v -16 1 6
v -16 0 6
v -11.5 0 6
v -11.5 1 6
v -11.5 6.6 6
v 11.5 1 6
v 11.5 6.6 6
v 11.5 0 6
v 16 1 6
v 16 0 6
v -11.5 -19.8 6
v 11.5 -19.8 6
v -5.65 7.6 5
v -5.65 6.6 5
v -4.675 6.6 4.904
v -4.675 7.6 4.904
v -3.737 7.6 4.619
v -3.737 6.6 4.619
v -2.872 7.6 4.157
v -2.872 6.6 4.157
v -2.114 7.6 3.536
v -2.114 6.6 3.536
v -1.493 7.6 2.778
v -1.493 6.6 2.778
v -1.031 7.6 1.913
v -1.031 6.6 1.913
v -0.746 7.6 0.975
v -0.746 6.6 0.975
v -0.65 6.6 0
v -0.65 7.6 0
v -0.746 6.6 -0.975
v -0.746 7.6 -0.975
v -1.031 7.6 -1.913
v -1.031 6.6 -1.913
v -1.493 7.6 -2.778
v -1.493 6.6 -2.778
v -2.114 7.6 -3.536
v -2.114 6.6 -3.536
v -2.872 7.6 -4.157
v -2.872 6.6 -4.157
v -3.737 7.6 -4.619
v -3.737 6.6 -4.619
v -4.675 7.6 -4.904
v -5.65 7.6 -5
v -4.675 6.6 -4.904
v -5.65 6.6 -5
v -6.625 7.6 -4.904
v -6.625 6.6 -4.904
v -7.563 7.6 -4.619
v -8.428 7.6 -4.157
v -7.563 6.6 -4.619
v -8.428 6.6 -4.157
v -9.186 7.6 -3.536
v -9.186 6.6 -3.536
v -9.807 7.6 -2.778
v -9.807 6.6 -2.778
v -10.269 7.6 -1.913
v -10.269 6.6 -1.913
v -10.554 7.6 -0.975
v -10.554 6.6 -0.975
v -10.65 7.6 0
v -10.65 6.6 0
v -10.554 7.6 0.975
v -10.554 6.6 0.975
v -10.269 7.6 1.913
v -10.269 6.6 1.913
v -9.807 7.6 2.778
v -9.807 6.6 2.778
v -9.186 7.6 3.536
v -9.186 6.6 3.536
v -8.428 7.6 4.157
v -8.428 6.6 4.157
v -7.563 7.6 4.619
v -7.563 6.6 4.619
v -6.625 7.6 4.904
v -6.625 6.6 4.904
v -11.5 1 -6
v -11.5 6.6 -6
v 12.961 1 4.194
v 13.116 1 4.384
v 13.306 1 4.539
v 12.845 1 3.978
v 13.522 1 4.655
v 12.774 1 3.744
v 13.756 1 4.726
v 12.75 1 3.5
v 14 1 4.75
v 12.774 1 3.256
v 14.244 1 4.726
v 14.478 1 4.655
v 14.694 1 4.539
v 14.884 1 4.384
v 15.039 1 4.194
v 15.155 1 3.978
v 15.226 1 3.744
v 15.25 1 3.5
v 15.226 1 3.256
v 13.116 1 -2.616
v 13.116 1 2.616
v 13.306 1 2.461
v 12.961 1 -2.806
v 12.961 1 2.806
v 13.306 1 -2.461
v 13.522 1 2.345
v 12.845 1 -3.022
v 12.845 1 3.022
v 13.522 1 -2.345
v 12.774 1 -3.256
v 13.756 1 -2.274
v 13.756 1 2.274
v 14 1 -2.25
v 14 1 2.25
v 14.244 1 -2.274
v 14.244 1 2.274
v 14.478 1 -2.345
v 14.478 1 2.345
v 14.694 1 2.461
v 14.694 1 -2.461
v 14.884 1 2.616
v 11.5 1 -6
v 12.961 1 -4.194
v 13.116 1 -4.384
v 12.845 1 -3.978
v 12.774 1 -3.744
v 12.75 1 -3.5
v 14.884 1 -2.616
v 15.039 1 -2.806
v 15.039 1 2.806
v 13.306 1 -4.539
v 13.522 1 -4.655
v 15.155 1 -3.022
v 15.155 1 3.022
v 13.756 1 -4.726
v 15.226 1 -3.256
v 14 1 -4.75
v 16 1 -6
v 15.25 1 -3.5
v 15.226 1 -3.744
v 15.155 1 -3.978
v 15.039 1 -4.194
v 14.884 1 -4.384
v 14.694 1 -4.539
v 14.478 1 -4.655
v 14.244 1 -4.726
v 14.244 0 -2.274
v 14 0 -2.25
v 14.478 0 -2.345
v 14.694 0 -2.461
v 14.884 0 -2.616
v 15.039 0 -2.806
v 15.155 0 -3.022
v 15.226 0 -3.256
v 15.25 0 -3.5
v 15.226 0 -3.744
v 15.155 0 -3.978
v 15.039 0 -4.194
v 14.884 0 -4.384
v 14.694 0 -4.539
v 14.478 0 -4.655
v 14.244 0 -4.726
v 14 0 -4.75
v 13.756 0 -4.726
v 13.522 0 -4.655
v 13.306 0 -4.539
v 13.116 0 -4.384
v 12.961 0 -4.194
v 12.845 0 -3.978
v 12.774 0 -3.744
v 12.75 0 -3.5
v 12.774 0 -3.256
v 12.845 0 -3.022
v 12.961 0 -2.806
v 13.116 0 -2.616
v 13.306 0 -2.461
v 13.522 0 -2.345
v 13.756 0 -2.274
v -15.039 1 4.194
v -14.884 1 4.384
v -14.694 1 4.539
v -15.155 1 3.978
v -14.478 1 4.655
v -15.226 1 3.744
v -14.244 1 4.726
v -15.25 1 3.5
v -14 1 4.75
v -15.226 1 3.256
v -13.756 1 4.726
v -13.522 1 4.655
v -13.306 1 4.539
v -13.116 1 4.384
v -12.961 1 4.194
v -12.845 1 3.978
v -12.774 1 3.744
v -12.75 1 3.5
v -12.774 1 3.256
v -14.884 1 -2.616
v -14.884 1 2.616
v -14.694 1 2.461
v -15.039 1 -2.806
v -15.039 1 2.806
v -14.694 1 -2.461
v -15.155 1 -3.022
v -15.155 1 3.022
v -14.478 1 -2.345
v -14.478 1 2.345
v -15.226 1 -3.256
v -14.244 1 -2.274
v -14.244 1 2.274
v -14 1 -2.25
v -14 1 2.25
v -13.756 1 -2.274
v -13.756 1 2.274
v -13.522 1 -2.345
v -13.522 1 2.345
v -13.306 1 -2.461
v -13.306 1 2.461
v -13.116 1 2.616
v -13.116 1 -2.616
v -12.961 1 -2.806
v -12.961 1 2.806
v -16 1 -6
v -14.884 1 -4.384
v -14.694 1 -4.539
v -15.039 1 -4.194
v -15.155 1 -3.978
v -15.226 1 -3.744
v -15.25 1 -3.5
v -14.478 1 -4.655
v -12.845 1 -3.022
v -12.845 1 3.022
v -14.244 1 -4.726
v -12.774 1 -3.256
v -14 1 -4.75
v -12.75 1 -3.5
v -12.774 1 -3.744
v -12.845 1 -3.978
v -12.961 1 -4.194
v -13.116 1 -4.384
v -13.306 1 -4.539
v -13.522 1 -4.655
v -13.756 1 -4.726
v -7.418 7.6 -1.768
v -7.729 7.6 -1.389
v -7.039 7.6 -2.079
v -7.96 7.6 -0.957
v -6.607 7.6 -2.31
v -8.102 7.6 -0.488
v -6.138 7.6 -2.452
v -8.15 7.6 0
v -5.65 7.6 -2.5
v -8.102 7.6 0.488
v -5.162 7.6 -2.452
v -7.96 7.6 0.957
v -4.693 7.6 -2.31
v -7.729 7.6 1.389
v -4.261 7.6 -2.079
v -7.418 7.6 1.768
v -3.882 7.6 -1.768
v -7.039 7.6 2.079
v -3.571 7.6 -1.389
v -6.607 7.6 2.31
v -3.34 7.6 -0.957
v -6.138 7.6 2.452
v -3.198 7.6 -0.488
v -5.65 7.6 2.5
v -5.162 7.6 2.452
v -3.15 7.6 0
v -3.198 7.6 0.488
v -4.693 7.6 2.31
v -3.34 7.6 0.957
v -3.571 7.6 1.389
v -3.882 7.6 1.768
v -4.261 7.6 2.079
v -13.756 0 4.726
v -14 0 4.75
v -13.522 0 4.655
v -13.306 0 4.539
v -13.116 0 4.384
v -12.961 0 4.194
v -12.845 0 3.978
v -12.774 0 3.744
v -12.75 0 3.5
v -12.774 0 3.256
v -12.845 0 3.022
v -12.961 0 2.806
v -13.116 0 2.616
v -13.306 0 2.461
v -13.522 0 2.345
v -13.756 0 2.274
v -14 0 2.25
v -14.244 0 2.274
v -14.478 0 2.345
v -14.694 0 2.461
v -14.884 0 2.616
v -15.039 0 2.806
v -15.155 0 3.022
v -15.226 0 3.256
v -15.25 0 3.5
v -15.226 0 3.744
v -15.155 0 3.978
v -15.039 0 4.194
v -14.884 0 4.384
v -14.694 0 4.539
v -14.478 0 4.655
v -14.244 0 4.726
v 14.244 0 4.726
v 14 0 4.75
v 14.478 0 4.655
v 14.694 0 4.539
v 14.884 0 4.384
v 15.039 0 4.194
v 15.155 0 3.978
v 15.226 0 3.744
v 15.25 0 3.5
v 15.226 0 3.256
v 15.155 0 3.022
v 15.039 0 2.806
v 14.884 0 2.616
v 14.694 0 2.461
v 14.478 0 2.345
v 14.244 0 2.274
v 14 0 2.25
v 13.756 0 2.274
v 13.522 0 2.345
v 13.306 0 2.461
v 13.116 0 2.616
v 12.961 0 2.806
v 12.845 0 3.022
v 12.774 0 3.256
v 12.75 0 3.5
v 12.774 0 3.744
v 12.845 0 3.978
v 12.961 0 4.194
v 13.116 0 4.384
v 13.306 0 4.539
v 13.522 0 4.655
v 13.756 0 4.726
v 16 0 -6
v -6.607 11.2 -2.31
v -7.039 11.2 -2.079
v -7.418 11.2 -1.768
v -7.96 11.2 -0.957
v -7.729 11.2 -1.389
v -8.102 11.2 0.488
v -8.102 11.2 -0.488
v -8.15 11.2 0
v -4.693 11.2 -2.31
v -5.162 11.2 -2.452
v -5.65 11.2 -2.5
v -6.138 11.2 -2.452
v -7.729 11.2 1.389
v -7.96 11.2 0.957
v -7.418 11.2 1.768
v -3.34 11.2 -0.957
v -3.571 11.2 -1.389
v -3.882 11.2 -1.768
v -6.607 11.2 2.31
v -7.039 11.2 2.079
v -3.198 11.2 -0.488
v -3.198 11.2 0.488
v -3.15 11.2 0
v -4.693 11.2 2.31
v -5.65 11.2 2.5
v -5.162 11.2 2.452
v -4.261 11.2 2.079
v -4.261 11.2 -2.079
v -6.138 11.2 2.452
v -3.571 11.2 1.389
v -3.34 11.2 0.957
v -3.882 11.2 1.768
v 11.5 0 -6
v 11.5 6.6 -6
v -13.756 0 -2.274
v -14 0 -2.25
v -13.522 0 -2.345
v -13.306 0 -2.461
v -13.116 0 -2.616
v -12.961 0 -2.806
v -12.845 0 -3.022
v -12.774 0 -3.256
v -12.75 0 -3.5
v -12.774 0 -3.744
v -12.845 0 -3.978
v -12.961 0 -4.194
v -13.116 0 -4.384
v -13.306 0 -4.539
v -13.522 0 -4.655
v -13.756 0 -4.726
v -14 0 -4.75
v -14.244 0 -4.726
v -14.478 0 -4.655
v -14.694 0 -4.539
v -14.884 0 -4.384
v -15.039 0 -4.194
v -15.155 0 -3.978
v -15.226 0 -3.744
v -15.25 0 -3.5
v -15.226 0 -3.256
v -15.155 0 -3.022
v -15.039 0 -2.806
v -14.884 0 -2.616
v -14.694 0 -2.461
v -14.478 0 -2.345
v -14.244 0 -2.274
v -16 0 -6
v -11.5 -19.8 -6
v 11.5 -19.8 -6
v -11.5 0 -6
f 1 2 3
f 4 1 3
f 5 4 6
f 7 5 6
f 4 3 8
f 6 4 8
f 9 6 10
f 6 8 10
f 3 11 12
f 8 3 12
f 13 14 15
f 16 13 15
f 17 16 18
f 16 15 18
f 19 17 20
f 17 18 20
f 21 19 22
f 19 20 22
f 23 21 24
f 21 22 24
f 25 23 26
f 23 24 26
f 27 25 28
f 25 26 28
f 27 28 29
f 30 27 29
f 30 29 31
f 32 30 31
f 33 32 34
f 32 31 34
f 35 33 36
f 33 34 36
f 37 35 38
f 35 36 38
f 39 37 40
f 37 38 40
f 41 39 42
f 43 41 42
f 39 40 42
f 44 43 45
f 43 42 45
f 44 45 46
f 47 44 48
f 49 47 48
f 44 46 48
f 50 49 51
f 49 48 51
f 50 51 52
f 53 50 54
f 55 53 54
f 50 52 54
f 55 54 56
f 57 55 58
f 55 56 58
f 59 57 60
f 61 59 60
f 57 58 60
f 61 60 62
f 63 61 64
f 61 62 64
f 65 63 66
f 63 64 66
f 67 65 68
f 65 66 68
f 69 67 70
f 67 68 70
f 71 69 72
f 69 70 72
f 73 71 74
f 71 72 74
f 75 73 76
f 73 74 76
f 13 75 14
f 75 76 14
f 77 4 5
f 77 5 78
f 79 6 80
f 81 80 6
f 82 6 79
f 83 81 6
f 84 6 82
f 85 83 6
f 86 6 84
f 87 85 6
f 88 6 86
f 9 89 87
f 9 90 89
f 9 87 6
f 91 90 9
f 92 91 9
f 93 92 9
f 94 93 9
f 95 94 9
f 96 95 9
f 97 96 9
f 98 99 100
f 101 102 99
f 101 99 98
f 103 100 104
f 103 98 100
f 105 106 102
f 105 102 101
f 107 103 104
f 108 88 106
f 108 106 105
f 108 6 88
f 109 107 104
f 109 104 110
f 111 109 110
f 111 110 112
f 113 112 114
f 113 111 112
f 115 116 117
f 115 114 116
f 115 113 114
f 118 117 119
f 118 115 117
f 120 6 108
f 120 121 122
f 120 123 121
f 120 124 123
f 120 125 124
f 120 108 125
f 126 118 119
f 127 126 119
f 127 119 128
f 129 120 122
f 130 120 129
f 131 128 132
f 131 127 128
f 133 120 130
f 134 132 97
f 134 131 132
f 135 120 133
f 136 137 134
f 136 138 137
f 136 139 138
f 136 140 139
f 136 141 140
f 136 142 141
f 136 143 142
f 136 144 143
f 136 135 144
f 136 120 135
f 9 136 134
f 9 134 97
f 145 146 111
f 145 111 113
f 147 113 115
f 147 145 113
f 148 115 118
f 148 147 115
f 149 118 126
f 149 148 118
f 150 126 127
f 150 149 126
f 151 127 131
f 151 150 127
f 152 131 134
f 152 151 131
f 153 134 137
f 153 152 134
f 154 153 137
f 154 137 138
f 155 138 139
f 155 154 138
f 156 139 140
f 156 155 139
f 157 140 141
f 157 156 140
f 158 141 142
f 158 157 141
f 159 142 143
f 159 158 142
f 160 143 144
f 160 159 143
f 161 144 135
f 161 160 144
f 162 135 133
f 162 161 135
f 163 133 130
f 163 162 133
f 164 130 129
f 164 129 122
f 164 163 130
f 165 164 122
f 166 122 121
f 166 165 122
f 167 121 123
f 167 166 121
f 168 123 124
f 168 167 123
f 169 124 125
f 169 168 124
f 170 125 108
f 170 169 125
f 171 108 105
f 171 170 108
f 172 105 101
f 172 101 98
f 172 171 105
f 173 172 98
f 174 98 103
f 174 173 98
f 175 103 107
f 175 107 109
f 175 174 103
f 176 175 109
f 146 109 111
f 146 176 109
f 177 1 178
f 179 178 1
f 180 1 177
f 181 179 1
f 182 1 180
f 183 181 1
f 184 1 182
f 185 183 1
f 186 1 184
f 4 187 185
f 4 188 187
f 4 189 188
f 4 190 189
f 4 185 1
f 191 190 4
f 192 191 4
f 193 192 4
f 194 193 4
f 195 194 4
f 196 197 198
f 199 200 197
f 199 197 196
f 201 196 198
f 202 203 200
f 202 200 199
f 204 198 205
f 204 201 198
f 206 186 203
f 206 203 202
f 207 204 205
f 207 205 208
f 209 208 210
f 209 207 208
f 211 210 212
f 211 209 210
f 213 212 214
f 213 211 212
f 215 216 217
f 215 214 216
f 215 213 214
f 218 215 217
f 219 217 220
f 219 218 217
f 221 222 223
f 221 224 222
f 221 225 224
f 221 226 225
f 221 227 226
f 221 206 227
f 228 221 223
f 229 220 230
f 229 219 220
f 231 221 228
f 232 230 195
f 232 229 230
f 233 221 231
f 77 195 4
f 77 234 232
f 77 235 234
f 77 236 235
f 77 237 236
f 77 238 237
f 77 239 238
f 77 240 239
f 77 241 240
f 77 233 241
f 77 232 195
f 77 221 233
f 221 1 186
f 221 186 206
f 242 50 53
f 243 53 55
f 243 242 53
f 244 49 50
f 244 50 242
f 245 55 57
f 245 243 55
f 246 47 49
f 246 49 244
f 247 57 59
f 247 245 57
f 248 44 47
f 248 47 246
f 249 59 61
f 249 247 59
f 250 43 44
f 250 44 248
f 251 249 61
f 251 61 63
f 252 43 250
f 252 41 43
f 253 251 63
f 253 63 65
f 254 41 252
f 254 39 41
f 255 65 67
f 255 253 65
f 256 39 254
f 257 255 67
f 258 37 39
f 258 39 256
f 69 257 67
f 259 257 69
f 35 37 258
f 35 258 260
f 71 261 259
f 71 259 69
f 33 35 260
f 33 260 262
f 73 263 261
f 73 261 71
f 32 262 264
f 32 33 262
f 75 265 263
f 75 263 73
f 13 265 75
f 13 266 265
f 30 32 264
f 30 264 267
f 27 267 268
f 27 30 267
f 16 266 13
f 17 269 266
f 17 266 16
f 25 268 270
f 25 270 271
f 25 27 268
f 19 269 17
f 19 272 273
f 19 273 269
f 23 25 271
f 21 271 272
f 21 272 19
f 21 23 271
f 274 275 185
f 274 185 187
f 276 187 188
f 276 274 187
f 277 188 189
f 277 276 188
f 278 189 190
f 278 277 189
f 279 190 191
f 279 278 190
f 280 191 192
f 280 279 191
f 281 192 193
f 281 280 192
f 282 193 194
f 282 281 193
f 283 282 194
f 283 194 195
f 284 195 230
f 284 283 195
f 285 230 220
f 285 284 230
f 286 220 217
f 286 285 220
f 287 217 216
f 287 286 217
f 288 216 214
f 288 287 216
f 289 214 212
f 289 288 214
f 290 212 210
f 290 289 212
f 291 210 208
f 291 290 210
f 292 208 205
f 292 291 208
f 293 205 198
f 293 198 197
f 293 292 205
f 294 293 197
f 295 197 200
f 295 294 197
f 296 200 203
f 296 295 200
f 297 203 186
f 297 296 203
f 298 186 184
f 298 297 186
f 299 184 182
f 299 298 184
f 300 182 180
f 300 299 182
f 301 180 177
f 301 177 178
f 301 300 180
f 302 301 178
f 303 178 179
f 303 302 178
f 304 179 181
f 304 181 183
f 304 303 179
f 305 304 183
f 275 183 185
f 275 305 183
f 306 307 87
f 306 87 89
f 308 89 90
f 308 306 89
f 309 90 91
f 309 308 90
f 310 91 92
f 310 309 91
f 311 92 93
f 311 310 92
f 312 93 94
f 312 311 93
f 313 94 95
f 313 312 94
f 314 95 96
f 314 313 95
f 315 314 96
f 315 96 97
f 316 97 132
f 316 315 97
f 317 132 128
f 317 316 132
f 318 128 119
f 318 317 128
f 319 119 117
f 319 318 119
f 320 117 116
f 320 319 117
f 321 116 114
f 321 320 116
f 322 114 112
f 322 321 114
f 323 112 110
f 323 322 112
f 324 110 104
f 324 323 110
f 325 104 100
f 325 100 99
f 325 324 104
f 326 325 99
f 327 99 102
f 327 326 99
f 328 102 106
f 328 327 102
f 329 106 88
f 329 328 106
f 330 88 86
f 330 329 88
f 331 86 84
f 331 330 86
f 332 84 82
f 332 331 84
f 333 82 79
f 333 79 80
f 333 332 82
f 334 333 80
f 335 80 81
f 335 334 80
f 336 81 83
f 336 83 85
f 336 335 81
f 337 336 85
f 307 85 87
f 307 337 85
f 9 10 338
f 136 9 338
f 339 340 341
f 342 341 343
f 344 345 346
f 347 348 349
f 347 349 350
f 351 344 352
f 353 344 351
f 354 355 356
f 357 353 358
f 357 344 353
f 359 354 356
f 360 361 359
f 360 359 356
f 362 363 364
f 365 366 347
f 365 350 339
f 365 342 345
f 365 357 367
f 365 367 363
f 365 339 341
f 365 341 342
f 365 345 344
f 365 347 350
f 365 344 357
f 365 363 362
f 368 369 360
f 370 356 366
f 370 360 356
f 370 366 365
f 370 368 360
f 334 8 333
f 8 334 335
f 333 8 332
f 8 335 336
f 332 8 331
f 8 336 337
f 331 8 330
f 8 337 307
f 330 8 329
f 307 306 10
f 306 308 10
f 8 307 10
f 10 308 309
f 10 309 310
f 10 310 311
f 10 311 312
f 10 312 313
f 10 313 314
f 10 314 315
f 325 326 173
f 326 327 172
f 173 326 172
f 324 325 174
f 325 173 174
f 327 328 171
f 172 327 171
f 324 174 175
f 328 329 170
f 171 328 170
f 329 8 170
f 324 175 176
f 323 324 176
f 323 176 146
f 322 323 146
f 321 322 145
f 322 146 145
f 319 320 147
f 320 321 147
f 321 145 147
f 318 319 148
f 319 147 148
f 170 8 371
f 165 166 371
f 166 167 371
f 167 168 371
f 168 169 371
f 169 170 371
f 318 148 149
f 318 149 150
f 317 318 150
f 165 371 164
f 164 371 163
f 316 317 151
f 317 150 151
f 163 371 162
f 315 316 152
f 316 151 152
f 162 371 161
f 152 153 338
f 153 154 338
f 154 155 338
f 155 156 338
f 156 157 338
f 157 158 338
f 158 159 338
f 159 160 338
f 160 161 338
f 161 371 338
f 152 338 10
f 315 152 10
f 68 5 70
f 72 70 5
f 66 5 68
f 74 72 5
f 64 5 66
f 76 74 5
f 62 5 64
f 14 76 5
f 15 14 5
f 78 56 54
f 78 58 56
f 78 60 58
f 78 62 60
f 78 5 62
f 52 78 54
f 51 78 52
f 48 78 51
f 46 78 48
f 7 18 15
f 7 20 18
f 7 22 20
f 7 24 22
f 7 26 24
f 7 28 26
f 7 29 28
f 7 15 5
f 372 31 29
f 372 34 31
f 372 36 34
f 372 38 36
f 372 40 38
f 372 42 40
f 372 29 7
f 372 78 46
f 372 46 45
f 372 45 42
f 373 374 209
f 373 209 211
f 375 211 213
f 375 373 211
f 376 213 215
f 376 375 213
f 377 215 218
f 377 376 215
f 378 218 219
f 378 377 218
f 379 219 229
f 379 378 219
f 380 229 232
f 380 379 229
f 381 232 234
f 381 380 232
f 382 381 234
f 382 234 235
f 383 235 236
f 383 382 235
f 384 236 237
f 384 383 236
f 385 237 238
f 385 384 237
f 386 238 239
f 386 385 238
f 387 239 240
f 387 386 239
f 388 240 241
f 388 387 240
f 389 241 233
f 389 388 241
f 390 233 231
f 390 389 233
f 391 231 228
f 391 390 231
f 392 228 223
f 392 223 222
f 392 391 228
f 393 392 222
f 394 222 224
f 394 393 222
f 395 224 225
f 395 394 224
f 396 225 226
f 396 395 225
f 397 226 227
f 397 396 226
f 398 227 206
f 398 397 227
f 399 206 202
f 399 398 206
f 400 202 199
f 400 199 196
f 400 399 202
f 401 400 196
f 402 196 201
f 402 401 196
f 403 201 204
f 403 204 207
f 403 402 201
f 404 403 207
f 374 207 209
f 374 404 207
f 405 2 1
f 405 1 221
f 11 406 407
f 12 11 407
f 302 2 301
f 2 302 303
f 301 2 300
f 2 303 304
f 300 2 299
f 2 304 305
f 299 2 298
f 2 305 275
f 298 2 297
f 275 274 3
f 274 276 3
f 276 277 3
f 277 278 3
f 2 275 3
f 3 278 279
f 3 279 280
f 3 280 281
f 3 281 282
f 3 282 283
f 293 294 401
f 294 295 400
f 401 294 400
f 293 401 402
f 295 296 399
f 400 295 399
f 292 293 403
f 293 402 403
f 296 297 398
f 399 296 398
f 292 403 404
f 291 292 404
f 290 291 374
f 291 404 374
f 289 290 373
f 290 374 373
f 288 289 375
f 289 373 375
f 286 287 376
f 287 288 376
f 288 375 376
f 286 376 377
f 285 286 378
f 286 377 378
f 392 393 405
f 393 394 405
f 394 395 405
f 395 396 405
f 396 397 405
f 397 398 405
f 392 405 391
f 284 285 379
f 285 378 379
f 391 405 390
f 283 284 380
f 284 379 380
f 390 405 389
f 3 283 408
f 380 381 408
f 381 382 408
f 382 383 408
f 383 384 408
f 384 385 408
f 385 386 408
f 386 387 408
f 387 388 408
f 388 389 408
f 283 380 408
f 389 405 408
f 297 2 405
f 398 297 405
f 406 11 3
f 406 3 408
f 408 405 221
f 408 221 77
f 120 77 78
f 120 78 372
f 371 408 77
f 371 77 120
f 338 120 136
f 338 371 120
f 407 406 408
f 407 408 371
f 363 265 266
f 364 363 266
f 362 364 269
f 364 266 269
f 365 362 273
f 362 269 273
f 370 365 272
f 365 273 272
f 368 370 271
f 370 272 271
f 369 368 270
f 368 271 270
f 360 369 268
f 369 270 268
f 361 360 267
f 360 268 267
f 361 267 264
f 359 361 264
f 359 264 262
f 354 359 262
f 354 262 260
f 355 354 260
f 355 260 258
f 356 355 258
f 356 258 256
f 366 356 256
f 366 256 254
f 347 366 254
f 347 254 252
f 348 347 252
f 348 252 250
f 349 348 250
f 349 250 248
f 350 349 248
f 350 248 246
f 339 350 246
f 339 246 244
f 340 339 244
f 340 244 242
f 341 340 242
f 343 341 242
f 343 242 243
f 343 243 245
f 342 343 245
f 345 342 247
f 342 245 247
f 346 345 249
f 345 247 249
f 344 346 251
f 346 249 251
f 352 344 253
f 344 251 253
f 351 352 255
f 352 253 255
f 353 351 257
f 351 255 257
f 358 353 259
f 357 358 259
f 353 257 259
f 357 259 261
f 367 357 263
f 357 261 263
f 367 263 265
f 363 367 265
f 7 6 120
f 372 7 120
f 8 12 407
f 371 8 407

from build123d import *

# Parameters (mm, degrees)
EXTRUDE_1_DEPTH      = 6.6
EXTRUDE_1_DEPTH_BACK = 19.8
SKETCH_1_W           = 23
SKETCH_1_H           = 12
SKETCH_1_3_W         = 4.5
SKETCH_1_3_H         = 12
SKETCH_1_3_R         = 1.25
EXTRUDE_2_DEPTH      = 1
SKETCH_2_R           = 2.5
EXTRUDE_3_DEPTH      = 4.6
SKETCH_3_R           = 5
EXTRUDE_4_DEPTH      = 1


with BuildPart() as part:
    # 草图1 → 凸台-拉伸1 (new, two sides: drawn at the far end of the back side and taken through both)
    with BuildSketch(Plane(origin=(0, 0, 0), x_dir=(1, 0, 0), z_dir=(0, 1, 0)).offset(-EXTRUDE_1_DEPTH_BACK)):
        Rectangle(SKETCH_1_W, SKETCH_1_H)
    extrude(amount=EXTRUDE_1_DEPTH + EXTRUDE_1_DEPTH_BACK)

    # 草图1<3> → 凸台-拉伸2 (add)
    # profile 1 of 2: a face of its own
    with BuildSketch(Plane(origin=(0, 0, 0), x_dir=(1, 0, 0), z_dir=(0, 1, 0))):
        with Locations((-13.75, 0)):
            Rectangle(SKETCH_1_3_W, SKETCH_1_3_H)
        with Locations((-14, -3.5)):
            Circle(SKETCH_1_3_R, mode=Mode.SUBTRACT)
        with Locations((-14, 3.5)):
            Circle(SKETCH_1_3_R, mode=Mode.SUBTRACT)
    # profile 2 of 2: a face of its own
    with BuildSketch(Plane(origin=(0, 0, 0), x_dir=(1, 0, 0), z_dir=(0, 1, 0))):
        with Locations((13.75, 0)):
            Rectangle(SKETCH_1_3_W, SKETCH_1_3_H)
        with Locations((14, -3.5)):
            Circle(SKETCH_1_3_R, mode=Mode.SUBTRACT)
        with Locations((14, 3.5)):
            Circle(SKETCH_1_3_R, mode=Mode.SUBTRACT)
    extrude(amount=EXTRUDE_2_DEPTH)

    # 草图2 → 凸台-拉伸3 (add)
    with BuildSketch(Plane(origin=(0, 6.6, 0), x_dir=(1, 0, 0), z_dir=(0, 1, 0))):
        with Locations((-5.65, 0)):
            Circle(SKETCH_2_R)
    extrude(amount=EXTRUDE_3_DEPTH)

    # 草图3 → 凸台-拉伸4 (add)
    with BuildSketch(Plane(origin=(0, 6.6, 0), x_dir=(1, 0, 0), z_dir=(0, 1, 0))):
        with Locations((-5.65, 0)):
            Circle(SKETCH_3_R)
    extrude(amount=EXTRUDE_4_DEPTH)


solid = part.part
